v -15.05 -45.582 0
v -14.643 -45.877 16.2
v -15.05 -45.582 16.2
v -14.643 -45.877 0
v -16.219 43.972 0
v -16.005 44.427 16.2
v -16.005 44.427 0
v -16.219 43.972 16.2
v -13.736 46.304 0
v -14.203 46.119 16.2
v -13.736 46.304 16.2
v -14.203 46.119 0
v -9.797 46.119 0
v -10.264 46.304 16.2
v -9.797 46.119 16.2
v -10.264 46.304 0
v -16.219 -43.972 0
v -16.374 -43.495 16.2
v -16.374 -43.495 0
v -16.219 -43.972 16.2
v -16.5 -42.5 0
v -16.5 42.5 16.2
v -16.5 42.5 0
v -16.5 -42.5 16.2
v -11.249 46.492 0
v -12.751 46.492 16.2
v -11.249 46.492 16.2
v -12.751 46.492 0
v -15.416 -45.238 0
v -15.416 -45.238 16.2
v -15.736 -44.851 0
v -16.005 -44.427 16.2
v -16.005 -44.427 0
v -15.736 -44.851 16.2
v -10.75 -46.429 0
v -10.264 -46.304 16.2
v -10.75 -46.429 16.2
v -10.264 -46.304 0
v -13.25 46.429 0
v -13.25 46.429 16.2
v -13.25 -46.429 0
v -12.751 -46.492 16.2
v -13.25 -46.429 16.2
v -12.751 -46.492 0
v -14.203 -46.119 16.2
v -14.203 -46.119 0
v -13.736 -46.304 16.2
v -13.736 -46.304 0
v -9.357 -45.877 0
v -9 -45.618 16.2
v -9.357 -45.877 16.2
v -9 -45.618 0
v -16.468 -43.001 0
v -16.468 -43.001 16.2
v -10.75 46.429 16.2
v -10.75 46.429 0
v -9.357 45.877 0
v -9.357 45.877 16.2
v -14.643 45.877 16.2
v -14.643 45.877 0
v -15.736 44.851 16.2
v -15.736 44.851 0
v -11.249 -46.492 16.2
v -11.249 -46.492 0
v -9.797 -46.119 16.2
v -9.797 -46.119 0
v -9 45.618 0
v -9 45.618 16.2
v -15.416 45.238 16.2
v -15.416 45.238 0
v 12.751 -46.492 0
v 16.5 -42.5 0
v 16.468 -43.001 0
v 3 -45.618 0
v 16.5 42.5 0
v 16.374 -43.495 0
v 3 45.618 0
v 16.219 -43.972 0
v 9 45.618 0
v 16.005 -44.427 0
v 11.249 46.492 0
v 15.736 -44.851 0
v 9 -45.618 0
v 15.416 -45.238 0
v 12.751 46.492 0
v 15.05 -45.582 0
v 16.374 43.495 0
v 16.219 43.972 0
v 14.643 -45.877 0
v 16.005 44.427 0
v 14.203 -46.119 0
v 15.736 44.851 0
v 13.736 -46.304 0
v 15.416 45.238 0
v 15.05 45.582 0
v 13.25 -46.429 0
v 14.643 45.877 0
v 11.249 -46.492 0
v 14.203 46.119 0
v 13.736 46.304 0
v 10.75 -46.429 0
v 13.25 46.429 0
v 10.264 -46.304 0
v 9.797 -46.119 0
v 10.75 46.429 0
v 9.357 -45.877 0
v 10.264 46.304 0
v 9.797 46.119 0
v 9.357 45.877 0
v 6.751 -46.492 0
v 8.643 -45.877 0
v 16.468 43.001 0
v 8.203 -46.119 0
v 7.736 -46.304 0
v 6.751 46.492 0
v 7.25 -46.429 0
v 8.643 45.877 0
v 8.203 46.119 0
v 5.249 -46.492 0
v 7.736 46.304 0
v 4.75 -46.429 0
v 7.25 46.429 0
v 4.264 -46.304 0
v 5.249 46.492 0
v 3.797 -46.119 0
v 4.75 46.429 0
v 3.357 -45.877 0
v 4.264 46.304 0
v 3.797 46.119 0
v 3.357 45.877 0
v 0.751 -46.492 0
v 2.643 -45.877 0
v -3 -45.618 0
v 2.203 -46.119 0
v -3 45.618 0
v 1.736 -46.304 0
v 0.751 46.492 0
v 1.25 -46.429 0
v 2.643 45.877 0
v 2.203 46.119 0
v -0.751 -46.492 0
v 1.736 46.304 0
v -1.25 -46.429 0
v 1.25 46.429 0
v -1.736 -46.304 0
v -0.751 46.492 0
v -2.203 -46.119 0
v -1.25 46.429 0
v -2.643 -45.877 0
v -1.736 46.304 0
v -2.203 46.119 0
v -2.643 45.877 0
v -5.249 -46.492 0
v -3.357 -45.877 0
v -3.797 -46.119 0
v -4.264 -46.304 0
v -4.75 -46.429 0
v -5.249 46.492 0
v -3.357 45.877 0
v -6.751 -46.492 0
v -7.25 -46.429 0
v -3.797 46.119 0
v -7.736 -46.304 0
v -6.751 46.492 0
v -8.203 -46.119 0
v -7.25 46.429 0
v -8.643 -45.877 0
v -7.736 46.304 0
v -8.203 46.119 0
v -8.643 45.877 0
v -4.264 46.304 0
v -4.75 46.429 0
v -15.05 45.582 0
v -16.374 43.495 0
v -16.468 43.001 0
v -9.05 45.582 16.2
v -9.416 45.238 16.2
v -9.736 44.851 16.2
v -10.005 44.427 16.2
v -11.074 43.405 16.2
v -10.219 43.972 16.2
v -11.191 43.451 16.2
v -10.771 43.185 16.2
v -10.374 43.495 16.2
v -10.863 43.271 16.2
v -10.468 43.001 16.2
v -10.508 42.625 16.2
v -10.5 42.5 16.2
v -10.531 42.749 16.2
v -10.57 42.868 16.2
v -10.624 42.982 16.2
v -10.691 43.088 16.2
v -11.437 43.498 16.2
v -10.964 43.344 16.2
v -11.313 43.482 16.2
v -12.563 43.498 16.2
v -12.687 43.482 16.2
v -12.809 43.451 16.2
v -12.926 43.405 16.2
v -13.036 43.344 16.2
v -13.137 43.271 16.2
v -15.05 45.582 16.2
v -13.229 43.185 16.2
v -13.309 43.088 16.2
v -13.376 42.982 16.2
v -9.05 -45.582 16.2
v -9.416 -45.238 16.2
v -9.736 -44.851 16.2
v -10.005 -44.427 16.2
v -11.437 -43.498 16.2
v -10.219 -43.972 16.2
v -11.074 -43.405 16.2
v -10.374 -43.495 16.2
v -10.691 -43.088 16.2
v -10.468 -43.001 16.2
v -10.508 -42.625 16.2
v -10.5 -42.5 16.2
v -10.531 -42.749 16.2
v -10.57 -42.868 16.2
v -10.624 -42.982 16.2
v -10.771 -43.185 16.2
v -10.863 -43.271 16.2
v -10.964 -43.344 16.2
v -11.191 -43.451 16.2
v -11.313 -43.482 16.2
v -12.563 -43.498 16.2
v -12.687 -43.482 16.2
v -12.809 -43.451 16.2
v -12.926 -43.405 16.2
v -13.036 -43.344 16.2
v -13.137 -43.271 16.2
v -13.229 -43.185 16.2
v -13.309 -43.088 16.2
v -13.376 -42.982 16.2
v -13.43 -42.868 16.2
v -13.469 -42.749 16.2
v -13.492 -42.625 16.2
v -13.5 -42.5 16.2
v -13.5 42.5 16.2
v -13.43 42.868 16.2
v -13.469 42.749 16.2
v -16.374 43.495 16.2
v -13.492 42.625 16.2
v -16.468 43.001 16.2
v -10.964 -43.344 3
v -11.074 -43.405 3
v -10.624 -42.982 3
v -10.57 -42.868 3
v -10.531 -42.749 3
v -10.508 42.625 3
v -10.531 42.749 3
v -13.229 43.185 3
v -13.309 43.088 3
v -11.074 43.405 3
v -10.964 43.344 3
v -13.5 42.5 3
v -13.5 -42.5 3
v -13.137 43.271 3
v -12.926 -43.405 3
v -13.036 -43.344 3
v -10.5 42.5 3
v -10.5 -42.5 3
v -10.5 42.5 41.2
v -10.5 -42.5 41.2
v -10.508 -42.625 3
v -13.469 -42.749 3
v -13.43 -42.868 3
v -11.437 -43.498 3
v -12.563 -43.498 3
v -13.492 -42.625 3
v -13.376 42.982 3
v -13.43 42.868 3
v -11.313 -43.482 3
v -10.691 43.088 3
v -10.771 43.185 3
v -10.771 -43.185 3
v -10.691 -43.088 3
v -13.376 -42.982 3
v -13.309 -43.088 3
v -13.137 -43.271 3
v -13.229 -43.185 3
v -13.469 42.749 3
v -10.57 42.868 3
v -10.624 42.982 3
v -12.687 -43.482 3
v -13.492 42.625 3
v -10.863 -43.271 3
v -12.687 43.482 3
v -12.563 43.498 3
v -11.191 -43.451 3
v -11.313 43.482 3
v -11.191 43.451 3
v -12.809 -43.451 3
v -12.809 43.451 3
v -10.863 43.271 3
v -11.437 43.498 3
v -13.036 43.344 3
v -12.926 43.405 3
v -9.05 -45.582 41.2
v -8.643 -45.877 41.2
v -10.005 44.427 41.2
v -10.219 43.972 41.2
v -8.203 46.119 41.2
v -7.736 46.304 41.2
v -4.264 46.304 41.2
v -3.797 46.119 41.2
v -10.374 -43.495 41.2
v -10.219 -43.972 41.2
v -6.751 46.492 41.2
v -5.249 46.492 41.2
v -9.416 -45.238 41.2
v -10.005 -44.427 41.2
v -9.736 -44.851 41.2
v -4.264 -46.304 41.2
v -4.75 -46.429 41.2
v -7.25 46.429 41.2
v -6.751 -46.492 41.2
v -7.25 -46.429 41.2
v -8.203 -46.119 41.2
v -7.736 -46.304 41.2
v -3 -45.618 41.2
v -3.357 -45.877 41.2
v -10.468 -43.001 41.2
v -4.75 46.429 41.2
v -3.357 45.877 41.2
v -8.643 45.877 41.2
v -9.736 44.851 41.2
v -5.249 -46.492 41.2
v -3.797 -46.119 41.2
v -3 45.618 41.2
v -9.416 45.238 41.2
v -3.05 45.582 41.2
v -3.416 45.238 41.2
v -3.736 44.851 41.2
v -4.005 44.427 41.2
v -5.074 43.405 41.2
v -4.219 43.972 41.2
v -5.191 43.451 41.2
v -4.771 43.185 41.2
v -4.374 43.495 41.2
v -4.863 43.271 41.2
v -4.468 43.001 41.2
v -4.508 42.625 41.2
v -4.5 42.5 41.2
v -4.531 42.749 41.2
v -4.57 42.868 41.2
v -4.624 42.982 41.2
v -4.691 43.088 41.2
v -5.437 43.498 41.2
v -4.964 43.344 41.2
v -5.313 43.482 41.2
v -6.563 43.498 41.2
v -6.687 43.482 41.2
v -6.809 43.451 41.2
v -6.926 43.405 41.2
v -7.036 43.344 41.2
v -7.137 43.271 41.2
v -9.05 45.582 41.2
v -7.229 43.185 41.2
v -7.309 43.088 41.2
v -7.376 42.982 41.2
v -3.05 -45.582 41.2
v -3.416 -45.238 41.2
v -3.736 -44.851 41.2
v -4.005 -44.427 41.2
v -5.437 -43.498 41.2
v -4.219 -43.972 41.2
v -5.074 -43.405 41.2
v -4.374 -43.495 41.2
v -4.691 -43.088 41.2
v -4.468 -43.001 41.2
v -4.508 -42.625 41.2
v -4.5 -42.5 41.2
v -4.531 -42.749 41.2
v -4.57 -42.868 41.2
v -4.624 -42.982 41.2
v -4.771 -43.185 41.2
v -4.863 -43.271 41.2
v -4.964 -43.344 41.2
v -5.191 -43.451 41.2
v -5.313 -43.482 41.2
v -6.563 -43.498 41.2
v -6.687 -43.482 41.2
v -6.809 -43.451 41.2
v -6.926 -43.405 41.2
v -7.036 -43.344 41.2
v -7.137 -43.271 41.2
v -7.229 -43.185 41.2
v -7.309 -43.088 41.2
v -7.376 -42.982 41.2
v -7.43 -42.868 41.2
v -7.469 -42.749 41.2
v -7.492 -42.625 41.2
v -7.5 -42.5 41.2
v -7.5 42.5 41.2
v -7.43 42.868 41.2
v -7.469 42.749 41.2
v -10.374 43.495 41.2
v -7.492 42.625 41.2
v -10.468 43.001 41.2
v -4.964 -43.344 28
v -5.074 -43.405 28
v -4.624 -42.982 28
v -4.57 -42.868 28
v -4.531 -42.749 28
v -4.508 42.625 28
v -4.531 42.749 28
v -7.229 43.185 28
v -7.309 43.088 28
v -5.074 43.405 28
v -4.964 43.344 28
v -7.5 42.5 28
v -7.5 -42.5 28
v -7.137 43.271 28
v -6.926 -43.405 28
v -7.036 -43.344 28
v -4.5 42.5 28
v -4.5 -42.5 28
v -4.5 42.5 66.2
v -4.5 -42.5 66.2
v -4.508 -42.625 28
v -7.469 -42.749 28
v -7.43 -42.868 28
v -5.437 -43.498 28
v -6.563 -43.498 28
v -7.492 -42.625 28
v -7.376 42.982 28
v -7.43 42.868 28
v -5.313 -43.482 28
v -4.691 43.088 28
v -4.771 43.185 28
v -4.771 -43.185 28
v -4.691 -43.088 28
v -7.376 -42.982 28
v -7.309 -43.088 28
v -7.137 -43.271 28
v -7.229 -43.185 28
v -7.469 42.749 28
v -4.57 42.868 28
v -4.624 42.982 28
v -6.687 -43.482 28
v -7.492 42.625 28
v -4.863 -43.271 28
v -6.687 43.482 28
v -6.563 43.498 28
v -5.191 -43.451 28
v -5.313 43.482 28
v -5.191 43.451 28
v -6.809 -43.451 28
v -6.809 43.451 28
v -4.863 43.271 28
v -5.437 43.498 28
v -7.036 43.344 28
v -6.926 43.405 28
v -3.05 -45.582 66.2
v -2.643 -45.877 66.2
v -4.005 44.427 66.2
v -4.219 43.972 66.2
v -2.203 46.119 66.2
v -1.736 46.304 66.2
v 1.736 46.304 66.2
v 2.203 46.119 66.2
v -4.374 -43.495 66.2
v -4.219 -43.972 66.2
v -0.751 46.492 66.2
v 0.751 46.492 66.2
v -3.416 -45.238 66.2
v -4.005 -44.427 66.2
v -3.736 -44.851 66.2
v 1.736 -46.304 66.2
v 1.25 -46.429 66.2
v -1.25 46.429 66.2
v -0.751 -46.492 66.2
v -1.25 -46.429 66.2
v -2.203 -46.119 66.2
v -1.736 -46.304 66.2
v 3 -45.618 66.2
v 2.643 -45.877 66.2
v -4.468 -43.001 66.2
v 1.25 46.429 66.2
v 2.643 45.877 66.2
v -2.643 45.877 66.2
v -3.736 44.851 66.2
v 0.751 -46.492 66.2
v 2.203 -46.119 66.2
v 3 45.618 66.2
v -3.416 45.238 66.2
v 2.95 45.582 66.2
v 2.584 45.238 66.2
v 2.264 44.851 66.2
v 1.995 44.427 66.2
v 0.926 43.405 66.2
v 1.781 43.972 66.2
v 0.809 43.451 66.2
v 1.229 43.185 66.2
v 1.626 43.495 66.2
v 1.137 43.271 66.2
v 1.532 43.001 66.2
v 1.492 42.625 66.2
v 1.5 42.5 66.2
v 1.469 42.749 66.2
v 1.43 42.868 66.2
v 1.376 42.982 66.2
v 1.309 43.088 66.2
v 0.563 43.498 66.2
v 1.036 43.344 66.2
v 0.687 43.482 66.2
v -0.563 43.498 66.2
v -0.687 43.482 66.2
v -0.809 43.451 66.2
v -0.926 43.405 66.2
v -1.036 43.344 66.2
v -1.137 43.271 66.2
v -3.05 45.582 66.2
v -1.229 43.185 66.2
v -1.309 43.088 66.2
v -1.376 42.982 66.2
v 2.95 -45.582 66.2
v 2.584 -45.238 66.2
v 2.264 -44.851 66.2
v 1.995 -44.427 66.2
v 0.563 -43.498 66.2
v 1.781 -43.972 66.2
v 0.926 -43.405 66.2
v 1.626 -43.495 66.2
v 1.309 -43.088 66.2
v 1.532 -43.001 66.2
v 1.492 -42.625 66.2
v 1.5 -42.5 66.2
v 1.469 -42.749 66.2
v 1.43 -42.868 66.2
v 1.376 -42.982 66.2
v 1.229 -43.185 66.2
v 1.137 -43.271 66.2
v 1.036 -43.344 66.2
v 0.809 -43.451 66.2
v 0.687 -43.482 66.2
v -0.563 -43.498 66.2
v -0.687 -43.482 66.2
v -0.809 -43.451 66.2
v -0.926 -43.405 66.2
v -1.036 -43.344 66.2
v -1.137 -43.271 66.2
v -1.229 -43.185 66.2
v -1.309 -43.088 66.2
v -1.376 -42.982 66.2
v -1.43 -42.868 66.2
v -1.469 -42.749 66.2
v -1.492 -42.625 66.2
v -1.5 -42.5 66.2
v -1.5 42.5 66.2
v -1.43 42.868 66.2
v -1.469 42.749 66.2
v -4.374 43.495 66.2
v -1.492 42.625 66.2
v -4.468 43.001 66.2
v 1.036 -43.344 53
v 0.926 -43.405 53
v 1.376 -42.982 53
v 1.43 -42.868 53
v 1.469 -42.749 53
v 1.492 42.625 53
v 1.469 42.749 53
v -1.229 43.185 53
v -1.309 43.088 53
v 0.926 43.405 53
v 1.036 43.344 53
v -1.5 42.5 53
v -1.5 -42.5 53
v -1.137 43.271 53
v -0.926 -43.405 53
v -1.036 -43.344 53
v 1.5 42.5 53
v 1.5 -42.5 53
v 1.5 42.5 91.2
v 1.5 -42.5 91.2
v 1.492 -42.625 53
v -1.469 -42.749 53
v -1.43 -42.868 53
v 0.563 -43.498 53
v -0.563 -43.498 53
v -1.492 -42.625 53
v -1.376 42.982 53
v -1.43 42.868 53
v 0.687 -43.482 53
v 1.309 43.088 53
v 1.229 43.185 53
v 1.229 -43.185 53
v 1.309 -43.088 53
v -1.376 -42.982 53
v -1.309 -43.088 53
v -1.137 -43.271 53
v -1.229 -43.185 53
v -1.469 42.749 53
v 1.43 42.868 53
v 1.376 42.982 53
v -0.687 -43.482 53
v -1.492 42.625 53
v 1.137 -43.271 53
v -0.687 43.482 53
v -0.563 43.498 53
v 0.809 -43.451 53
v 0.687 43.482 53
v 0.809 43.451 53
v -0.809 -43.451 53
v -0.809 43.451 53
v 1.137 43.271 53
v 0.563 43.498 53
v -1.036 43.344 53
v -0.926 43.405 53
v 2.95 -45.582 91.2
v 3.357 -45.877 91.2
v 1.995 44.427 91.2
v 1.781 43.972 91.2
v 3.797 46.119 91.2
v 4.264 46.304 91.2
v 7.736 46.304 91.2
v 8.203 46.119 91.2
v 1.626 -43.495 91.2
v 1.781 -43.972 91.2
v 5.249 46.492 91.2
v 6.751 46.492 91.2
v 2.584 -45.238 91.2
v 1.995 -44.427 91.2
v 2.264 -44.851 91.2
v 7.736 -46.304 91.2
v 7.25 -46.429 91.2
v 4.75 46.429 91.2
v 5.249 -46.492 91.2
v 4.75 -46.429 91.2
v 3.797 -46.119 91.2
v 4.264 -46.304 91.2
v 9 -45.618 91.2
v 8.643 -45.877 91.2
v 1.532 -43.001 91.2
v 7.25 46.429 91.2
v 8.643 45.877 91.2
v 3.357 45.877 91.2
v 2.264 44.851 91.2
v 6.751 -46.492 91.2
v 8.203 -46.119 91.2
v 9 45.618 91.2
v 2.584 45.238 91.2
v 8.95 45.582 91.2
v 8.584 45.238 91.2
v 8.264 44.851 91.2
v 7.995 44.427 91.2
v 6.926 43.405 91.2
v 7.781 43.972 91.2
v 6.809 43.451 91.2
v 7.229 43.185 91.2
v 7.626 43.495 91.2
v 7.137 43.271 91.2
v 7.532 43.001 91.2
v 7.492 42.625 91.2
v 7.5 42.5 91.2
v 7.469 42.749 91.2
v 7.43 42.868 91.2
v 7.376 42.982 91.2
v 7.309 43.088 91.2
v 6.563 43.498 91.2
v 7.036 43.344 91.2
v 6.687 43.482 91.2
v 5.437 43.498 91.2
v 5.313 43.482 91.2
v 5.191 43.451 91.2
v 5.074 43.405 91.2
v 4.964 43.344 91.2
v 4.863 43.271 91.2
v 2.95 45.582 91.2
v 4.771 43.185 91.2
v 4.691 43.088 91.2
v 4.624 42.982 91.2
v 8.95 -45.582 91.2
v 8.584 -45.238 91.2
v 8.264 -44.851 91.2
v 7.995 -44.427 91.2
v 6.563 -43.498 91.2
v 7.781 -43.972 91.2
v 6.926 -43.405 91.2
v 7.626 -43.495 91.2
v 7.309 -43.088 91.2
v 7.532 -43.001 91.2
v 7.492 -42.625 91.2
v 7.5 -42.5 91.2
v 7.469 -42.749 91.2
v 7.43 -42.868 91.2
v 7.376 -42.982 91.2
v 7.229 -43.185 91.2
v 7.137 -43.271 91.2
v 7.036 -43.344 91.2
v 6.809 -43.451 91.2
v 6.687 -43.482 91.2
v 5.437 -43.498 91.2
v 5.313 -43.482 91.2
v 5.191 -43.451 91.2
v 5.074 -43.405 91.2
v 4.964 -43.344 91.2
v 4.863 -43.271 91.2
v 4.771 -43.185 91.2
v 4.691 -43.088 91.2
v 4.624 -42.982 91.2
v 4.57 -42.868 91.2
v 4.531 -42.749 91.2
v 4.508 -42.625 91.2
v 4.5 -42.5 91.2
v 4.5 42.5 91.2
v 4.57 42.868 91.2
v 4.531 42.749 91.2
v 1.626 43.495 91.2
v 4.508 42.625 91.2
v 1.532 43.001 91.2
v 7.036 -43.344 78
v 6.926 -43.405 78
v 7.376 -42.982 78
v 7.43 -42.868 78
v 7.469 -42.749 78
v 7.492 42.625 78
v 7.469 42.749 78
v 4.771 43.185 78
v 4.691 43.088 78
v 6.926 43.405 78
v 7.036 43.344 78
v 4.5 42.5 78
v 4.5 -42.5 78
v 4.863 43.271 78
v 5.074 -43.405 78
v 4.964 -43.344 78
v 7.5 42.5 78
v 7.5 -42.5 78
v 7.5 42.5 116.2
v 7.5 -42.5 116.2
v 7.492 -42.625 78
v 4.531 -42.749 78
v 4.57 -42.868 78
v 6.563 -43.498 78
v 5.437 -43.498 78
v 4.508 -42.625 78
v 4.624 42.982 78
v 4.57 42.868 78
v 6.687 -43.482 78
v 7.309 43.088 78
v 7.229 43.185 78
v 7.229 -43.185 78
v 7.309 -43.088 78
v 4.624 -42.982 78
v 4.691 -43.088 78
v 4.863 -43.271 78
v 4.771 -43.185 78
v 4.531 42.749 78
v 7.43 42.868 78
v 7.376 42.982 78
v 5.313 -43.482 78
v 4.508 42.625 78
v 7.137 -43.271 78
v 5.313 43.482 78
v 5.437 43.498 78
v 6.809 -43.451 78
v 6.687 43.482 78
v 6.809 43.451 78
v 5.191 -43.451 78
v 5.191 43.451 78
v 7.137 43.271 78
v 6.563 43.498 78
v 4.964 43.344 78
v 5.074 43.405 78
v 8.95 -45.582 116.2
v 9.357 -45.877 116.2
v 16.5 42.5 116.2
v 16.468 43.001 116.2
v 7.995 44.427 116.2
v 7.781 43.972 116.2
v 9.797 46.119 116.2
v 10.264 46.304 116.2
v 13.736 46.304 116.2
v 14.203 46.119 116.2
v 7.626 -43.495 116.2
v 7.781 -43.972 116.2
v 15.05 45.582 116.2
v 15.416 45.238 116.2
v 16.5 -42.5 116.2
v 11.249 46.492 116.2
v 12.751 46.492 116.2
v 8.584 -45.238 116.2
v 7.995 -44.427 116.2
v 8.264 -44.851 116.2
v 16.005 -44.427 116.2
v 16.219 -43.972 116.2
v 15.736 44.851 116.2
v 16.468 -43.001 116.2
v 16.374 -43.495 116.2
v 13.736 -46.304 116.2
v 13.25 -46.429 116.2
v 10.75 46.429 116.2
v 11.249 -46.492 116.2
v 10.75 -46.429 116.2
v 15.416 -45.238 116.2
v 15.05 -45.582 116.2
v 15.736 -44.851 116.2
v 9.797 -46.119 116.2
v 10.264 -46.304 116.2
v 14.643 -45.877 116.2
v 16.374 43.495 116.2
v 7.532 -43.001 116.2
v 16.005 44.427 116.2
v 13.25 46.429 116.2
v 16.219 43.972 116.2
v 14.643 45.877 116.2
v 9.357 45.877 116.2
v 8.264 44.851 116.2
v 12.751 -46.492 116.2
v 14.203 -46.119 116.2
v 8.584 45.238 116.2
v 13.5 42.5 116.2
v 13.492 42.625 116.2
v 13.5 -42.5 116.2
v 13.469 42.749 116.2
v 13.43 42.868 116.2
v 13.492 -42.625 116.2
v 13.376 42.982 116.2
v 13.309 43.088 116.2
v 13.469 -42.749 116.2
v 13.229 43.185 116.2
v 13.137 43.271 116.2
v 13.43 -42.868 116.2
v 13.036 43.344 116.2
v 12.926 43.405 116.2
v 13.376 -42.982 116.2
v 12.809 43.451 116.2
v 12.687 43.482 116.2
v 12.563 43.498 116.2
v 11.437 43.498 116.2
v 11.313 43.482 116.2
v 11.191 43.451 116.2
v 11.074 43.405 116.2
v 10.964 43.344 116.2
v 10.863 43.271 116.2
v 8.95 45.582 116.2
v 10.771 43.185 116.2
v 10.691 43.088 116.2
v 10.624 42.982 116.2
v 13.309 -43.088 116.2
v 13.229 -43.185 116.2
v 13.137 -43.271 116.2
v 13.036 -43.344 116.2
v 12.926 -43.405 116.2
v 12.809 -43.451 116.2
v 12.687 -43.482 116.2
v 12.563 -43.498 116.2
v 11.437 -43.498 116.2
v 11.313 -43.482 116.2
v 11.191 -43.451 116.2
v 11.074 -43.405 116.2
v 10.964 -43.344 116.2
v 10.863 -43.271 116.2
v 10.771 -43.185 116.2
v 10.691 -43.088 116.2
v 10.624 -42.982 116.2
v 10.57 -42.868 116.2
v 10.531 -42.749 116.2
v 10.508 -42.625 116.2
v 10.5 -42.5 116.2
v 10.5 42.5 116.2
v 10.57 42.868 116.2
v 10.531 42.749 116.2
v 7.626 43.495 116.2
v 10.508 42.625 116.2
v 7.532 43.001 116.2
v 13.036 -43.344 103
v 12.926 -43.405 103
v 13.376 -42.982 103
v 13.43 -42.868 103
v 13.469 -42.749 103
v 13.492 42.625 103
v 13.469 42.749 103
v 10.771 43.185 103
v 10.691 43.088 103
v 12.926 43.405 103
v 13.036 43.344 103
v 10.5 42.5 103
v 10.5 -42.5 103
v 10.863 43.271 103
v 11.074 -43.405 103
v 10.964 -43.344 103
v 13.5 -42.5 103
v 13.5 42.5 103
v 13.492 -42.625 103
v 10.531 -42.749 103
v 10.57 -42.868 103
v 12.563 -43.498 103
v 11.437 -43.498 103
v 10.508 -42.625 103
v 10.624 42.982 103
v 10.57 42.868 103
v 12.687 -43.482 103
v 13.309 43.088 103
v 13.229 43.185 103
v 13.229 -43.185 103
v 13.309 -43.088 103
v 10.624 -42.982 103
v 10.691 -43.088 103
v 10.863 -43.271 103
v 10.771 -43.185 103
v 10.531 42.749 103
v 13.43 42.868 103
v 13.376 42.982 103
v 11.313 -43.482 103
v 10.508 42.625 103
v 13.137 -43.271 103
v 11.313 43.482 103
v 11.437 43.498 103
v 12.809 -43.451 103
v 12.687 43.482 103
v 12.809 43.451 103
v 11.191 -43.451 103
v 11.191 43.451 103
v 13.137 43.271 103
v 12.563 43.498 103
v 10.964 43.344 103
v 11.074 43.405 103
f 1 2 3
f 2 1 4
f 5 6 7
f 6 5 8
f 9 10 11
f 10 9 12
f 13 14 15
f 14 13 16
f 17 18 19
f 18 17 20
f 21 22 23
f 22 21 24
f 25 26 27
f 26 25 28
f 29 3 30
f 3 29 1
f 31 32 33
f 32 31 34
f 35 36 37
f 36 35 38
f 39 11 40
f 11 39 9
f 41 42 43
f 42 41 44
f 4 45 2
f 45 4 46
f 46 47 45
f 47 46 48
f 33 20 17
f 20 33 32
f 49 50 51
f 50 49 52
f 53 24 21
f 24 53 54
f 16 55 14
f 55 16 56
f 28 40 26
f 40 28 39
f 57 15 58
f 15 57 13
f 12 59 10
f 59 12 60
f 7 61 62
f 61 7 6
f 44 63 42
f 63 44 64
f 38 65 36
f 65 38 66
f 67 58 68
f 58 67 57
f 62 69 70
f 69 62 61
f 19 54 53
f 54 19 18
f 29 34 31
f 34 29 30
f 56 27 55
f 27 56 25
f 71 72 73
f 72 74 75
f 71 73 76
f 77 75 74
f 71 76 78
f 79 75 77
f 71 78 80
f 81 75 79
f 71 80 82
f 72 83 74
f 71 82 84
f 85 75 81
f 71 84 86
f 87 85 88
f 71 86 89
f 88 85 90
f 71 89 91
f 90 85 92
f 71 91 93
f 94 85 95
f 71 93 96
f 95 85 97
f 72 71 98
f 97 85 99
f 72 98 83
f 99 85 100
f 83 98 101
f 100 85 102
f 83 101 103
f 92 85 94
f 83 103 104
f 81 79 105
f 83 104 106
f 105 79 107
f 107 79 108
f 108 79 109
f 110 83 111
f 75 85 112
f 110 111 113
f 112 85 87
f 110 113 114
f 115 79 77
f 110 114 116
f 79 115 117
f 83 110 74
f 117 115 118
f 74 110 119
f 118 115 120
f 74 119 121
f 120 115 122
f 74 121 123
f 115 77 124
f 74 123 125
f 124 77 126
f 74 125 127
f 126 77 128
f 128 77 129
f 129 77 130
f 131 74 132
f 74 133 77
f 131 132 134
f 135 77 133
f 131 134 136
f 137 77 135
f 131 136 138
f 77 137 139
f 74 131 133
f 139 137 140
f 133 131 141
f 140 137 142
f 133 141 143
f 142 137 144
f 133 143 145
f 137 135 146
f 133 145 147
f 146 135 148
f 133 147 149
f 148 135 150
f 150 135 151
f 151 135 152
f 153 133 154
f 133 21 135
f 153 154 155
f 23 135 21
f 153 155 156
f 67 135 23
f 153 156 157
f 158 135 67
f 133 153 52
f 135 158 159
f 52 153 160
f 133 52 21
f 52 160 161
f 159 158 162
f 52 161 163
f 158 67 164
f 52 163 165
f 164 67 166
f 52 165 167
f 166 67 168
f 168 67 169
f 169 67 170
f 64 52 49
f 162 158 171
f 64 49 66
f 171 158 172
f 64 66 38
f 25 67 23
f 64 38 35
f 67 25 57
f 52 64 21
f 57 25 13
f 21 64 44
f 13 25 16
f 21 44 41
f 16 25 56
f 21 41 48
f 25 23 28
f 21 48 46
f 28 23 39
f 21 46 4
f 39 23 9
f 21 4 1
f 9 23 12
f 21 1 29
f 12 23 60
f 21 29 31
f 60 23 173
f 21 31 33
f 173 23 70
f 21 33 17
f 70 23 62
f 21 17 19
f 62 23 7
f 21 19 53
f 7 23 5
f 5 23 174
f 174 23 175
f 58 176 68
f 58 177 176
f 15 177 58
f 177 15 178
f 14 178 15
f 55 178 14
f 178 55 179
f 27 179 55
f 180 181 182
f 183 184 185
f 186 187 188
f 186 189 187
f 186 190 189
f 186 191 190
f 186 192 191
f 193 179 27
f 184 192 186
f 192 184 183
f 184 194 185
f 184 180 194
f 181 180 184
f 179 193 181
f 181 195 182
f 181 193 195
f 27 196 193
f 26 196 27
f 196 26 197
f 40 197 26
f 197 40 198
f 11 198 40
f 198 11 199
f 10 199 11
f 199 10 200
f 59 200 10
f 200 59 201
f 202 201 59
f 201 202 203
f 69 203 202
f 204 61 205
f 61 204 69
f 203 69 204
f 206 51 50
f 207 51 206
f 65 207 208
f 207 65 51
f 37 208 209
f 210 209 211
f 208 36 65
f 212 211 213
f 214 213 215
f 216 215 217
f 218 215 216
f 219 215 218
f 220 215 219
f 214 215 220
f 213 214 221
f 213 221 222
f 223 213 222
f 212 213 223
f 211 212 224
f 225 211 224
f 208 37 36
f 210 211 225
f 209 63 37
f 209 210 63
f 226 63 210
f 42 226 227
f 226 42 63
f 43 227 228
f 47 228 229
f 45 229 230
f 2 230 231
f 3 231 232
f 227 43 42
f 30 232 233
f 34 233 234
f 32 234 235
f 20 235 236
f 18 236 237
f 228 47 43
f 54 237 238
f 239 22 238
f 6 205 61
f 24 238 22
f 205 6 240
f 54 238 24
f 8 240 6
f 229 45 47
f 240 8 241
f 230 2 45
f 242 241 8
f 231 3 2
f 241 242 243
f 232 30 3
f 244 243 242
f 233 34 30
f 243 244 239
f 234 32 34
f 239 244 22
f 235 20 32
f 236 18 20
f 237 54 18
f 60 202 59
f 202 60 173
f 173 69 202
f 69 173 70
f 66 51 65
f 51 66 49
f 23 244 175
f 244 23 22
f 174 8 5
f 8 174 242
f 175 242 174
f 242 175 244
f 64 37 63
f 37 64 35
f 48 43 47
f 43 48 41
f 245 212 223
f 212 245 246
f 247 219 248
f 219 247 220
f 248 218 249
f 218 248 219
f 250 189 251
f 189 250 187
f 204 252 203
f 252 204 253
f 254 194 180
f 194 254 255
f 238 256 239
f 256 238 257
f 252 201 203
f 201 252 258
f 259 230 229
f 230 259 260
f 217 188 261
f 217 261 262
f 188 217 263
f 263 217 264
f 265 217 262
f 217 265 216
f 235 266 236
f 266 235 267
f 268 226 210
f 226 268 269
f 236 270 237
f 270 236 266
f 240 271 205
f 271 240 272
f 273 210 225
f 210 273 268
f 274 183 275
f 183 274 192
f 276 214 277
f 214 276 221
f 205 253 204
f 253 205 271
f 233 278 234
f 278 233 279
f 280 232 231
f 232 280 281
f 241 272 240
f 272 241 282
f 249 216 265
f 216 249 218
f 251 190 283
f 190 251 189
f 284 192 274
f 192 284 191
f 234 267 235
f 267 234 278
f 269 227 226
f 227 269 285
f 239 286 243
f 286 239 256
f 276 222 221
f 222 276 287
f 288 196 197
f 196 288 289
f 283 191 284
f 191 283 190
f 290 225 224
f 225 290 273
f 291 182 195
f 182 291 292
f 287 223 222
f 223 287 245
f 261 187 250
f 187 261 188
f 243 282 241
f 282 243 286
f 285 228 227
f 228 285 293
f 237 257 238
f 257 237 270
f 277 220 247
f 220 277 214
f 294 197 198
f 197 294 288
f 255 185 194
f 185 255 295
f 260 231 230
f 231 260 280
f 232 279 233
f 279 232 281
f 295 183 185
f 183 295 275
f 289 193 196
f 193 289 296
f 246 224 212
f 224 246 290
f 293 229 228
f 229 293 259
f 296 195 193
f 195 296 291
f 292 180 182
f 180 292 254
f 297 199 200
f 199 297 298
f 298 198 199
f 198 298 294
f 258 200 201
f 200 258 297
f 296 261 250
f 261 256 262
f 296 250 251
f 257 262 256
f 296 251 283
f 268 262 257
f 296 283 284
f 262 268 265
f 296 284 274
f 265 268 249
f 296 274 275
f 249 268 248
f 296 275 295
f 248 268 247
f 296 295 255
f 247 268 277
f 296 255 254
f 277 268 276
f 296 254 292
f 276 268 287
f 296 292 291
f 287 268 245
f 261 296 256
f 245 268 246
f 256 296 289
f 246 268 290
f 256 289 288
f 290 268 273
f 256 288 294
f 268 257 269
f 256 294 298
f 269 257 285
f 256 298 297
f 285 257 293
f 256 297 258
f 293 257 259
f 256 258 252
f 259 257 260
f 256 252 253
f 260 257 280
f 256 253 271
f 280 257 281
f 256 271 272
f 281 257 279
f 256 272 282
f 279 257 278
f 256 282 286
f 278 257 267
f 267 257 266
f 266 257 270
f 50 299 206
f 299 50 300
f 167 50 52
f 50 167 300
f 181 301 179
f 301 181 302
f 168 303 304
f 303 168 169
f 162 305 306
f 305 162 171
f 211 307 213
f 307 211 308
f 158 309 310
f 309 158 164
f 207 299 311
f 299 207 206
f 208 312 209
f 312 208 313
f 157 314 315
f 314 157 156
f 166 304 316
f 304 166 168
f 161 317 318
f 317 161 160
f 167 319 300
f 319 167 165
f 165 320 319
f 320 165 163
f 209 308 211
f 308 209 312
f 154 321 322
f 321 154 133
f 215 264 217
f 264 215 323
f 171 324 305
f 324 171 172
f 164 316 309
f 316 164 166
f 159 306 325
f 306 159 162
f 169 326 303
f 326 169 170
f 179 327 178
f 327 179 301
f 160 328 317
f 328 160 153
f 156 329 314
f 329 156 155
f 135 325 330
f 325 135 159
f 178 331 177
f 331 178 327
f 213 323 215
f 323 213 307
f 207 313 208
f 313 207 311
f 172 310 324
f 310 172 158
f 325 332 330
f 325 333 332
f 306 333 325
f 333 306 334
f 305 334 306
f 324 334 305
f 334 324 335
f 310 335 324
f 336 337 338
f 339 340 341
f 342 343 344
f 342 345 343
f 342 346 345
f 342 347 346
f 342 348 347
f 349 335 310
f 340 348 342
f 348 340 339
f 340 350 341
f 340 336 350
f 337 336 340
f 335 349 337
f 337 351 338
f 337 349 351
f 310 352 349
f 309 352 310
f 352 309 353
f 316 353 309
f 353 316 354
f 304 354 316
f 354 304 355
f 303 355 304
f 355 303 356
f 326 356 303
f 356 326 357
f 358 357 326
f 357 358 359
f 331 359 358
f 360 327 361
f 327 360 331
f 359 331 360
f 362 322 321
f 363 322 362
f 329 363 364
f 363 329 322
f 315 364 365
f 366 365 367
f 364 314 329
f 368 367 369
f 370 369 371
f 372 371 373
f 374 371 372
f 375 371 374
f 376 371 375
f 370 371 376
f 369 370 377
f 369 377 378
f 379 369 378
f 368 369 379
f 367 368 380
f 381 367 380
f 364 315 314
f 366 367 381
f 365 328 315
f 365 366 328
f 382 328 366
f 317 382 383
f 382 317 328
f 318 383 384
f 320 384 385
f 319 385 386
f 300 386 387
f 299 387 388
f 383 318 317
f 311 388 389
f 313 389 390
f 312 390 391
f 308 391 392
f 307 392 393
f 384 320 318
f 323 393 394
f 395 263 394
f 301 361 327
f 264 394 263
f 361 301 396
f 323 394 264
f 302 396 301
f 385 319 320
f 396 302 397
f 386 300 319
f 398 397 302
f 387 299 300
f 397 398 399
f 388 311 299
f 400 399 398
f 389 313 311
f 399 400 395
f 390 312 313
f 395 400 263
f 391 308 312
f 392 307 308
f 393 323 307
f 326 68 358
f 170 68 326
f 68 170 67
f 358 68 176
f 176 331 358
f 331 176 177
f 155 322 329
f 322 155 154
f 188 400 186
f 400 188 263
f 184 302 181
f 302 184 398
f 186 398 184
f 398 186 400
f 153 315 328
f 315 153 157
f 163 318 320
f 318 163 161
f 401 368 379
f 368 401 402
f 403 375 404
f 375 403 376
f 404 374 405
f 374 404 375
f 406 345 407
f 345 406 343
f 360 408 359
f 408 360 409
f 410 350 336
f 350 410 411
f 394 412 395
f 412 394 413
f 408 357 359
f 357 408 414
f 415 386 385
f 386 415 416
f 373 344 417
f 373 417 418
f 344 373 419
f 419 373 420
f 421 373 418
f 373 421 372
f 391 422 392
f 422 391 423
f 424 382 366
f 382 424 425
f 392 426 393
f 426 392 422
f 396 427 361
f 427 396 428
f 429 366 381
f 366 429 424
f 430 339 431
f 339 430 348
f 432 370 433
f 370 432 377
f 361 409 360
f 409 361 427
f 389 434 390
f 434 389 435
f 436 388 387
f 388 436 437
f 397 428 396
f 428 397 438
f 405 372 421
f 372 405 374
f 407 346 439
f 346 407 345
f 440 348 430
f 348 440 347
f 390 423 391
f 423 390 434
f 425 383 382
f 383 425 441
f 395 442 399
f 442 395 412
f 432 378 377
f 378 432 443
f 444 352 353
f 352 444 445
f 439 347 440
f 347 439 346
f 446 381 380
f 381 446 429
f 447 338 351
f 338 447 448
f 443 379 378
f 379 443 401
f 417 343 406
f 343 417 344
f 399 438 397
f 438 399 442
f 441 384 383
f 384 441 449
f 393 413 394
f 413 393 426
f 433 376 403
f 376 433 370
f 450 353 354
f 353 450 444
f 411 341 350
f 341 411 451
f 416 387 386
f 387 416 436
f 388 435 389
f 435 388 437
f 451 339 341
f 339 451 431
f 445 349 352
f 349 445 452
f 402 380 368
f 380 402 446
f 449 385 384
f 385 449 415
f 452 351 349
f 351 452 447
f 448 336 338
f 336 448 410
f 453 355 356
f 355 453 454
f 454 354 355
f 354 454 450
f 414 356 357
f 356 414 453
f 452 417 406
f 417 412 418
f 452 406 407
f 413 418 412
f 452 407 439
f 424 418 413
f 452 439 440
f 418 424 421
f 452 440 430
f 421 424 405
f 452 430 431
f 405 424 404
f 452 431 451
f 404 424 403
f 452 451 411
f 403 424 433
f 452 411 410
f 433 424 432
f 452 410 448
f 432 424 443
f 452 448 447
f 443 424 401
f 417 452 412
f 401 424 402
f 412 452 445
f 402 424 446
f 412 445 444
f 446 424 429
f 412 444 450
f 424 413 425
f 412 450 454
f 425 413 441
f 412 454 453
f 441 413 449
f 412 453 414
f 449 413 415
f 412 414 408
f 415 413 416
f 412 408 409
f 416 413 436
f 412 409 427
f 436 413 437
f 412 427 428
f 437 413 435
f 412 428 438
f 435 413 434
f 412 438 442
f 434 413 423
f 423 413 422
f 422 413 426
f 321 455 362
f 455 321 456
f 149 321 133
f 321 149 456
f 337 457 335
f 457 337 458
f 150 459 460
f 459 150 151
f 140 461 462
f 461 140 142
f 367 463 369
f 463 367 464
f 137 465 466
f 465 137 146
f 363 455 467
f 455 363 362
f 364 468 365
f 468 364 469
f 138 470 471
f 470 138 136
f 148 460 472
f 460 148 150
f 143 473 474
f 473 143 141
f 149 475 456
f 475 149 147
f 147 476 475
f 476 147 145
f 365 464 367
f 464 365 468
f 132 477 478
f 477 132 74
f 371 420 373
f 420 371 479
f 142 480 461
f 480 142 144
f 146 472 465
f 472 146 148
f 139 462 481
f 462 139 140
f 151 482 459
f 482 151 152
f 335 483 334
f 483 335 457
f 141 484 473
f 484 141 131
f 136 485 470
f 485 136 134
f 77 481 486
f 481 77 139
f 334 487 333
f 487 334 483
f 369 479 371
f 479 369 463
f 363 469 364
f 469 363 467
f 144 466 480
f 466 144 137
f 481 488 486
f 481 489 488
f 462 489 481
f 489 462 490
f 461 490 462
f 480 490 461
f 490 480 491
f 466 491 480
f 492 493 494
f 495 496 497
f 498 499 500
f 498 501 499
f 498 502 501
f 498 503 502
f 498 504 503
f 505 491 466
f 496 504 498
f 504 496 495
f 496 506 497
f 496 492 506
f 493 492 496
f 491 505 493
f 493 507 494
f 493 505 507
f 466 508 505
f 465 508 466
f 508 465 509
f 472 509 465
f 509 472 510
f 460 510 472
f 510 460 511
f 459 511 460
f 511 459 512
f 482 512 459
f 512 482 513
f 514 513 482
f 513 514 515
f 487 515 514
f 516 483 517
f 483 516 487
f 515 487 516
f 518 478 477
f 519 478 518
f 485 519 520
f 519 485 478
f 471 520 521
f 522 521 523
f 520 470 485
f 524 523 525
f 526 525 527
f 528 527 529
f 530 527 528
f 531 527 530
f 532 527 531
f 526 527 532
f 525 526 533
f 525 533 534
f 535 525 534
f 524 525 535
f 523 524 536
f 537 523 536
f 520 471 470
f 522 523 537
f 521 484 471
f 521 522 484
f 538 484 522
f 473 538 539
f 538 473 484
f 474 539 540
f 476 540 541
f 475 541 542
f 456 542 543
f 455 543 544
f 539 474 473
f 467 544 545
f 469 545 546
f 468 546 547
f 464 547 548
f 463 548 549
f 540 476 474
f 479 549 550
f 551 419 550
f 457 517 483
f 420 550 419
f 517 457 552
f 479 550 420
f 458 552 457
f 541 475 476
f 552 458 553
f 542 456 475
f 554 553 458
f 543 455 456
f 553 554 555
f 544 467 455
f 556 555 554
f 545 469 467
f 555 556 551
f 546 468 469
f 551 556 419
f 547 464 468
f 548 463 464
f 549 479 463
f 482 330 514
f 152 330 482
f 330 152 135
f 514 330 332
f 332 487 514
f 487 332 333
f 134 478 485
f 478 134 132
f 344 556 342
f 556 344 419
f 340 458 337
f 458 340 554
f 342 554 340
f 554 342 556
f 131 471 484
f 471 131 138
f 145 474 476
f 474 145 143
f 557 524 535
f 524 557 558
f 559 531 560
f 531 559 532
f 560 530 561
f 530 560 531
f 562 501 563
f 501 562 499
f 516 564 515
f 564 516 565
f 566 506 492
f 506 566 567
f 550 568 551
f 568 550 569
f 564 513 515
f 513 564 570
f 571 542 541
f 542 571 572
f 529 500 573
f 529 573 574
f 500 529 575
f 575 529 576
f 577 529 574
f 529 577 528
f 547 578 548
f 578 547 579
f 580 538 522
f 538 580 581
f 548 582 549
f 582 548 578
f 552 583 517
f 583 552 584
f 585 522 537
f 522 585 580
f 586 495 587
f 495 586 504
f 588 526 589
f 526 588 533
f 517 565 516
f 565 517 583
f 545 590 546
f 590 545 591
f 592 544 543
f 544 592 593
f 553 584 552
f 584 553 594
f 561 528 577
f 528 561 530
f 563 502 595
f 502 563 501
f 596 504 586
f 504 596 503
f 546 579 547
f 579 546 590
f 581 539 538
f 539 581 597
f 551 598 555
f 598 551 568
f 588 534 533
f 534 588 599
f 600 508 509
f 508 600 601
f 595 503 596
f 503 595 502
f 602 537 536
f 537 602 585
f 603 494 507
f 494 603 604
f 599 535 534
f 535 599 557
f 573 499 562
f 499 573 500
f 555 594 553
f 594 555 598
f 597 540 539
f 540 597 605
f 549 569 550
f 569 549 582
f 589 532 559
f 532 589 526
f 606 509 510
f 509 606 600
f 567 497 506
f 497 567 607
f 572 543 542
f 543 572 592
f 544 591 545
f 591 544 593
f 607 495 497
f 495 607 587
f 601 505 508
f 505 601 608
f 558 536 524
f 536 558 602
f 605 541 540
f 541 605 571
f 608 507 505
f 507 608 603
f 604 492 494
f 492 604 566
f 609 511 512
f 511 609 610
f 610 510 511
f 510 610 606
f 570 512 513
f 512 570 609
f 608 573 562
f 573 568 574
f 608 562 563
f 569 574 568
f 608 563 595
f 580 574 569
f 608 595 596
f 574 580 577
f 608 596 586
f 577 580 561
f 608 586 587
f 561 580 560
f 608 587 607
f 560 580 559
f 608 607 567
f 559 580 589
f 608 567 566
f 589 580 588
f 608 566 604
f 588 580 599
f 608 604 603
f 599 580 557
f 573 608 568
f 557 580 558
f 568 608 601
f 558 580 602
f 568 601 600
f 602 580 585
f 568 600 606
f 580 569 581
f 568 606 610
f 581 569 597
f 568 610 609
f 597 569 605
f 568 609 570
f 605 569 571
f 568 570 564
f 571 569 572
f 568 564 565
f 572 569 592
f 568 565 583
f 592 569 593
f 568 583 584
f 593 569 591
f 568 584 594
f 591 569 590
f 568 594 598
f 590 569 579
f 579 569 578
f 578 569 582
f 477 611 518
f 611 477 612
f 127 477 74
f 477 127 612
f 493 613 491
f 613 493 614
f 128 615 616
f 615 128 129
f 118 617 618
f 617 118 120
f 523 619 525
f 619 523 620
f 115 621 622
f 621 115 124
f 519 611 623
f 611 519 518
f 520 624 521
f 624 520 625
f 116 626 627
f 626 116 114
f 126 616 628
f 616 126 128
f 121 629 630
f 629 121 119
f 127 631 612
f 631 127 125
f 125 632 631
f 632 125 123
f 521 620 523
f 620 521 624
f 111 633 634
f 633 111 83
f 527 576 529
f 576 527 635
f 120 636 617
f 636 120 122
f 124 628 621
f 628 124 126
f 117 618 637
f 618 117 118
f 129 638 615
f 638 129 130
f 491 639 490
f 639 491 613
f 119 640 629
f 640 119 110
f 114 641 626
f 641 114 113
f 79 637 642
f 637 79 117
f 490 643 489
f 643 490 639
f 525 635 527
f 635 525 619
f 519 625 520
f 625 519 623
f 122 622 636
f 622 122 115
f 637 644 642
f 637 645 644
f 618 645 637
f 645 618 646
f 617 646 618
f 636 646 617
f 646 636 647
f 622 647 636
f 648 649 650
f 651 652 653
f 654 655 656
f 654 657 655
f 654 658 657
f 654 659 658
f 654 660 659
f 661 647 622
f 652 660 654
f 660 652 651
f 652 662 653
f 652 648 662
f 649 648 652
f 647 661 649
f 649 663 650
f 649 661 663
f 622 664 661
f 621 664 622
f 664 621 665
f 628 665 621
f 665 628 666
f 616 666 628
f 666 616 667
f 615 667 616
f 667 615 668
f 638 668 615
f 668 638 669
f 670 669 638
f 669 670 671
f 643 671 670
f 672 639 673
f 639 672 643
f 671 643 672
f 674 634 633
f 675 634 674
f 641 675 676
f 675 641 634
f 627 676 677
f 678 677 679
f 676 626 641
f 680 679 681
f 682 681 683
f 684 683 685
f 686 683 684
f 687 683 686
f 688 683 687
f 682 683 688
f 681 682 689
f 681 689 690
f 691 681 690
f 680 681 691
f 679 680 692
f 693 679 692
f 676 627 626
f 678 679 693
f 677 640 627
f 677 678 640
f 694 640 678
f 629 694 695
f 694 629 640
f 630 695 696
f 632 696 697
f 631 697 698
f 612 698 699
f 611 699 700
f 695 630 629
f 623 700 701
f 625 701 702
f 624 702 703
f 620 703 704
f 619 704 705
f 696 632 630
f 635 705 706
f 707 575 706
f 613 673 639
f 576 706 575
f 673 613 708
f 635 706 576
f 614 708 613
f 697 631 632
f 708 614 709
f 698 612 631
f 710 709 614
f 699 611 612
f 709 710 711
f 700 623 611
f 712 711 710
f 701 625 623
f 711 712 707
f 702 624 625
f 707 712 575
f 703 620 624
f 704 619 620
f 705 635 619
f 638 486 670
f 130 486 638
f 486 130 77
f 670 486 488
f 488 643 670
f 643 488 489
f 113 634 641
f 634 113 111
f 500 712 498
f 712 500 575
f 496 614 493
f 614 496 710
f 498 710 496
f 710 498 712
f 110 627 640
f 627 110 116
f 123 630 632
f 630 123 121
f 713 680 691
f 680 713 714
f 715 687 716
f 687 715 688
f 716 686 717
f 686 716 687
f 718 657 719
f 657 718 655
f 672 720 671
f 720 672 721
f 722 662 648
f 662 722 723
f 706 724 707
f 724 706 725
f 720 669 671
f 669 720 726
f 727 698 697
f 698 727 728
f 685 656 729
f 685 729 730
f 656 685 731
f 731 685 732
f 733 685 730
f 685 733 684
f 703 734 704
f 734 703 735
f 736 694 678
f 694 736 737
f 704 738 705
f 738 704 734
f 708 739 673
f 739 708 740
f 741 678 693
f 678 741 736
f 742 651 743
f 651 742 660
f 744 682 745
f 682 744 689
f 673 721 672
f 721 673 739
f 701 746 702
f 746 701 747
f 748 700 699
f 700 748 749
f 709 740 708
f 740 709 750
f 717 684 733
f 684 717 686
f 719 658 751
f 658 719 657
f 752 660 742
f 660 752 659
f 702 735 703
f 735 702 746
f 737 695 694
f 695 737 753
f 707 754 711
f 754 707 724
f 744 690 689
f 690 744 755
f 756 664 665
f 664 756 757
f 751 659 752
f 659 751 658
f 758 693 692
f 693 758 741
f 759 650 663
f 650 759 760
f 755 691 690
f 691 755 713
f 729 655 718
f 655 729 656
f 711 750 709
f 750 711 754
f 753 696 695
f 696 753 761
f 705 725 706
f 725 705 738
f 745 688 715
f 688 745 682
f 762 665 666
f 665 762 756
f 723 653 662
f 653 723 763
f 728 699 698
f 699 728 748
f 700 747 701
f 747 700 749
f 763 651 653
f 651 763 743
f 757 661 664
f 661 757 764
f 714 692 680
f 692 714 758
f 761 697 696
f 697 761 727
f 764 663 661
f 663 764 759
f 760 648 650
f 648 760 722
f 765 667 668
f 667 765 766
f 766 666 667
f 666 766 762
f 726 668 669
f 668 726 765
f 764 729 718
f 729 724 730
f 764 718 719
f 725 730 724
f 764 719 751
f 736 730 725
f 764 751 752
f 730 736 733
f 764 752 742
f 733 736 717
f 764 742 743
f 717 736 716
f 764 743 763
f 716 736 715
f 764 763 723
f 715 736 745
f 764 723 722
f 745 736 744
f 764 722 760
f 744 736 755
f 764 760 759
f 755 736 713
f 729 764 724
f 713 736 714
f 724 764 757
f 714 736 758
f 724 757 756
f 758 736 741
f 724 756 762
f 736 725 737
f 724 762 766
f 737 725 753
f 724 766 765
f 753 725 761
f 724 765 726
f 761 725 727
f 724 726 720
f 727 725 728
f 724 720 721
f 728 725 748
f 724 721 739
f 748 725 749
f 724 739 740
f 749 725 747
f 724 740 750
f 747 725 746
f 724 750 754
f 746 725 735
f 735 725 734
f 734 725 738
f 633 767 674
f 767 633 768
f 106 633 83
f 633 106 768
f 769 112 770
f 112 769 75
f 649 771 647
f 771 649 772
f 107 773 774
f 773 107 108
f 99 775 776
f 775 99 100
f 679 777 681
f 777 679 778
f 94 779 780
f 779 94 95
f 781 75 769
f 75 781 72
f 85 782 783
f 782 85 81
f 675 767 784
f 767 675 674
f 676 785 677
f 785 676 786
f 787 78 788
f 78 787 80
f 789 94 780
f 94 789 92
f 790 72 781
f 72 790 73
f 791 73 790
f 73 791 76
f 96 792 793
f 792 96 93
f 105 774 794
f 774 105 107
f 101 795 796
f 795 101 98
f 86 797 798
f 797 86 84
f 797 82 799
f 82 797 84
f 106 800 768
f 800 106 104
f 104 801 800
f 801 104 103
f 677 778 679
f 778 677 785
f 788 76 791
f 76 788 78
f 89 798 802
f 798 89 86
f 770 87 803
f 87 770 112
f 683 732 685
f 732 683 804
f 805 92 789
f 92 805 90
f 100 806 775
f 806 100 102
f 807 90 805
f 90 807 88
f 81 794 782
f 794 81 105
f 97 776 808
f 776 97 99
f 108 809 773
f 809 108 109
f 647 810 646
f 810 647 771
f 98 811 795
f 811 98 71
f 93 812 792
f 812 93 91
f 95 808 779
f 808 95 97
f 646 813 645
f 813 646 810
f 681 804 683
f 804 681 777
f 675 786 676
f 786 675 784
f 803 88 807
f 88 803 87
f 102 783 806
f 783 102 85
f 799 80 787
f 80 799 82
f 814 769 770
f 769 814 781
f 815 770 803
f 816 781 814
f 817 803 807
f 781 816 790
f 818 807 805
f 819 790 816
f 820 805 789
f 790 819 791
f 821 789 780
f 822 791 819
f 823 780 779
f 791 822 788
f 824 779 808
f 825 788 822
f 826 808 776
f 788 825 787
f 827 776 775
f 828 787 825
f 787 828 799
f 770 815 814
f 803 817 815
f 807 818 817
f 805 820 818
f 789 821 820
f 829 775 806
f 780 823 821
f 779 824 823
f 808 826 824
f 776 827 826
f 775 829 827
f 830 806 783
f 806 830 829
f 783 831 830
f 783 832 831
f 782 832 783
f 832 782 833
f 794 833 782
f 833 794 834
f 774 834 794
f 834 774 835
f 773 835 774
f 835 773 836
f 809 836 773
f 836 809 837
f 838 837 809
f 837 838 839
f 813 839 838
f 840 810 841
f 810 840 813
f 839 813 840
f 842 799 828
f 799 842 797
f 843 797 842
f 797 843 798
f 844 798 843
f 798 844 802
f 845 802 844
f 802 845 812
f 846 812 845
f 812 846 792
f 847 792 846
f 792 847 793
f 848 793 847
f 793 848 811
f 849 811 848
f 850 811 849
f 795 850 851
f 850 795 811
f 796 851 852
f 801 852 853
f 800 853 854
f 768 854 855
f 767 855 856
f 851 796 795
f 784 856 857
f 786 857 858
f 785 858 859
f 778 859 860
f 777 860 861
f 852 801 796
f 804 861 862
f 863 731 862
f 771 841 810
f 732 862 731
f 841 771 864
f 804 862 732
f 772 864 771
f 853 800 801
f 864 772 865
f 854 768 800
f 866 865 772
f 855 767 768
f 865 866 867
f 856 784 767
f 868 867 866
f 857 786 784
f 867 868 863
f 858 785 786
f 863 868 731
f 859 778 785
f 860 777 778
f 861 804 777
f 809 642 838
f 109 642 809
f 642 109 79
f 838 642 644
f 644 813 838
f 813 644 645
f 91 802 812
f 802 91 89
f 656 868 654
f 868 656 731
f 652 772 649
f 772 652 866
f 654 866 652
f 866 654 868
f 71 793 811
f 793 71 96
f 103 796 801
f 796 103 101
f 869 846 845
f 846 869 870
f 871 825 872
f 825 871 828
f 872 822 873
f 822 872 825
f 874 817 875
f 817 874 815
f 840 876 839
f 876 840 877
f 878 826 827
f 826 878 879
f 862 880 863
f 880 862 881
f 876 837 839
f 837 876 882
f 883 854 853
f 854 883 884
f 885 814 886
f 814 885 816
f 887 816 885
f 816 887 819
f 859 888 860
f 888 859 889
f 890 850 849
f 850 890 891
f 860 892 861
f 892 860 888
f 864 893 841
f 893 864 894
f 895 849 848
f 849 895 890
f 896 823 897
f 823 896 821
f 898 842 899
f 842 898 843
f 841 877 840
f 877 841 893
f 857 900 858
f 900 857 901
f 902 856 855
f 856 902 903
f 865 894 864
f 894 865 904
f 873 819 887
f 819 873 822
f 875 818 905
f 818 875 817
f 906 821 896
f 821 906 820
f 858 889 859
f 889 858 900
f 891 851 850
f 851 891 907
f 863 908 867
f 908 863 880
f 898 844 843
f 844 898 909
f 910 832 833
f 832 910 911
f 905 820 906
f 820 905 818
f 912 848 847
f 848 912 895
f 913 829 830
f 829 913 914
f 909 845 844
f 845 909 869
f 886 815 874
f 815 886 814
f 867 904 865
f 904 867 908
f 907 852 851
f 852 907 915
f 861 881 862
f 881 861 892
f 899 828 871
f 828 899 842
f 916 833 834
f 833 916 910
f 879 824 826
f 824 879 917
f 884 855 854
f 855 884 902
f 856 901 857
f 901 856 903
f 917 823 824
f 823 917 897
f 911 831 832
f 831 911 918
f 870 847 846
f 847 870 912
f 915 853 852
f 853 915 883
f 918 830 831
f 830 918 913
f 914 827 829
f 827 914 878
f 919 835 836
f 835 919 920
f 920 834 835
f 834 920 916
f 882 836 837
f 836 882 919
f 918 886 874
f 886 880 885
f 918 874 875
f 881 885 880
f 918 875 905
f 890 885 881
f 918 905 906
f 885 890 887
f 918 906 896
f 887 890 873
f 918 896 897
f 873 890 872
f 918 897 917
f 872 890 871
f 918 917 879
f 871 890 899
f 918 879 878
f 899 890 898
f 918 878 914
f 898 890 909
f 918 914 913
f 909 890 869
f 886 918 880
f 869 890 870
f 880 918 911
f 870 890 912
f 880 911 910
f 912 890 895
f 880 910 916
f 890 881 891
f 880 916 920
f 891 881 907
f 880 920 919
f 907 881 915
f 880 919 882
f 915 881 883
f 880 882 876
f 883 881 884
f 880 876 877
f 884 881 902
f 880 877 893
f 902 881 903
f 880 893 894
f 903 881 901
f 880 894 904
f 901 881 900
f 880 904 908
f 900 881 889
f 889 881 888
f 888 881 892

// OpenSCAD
$fn = 50;

/* rounded cube */
module rc(x,y,z,r) {
    //echo("rc x=",x,", y=",y,",z=",z,",r=",r);
    //%cube([x+2*r,y+2*r,z], center=true);
    hull() {
        translate([(x/2),(y/2),0]) 
            cylinder(r=r, h=z, center=true);
        translate([(-x/2),(y/2),0]) 
            cylinder(r=r, h=z, center=true);
        translate([(x/2),(-y/2),0]) 
            cylinder(r=r, h=z, center=true);
        translate([(-x/2),(-y/2),0]) 
            cylinder(r=r, h=z, center=true);
    }
}

/* one card holder */
module ch(x,y,z,s,t,down) {
    difference(){
        rc(z,x,y,s+t);
        rc(z,x,y,s);
    }
    translate([0,0,(-y/2) +t/2 - down/2])
    rc(z,x,t+down,s+t);
}

module cardholder(
    size=[85, 54, 1],
    thickness=3,
    spacing=1,
    cards=4,
    delta=25,
    visibility=0.3)
{
    will_it_draw = true;
    /* validate arguments */
    
    if (spacing < 0) {
		spacing = 0;
	}

	if (thickness < 0) {
		thickness = 0;
	}

	if (visibility < 0) {
		visibility = 0;
	}

	if (visibility > 1) {
		visibility = 1;
	}
    
    x = size[0];
    y = size[1];
    z = size[2];
    s = spacing;
    t = thickness;
    c = cards;
    d = delta;
    v = visibility;
    X = x + s;
    Y = y + s;
    Z = z + s;
    
    
    if (will_it_draw) {
    translate([-(c*z+s+t+s+t),0,0])
    for (a =[0:c]) {
        translate([a*t*2,0,a*d]) //pousun o delta
        translate([0,0,(y*v)/2]) //na osu z
        ch(x,y*v,z,s,t,a*d);
    }
    }
}

cardholder();
